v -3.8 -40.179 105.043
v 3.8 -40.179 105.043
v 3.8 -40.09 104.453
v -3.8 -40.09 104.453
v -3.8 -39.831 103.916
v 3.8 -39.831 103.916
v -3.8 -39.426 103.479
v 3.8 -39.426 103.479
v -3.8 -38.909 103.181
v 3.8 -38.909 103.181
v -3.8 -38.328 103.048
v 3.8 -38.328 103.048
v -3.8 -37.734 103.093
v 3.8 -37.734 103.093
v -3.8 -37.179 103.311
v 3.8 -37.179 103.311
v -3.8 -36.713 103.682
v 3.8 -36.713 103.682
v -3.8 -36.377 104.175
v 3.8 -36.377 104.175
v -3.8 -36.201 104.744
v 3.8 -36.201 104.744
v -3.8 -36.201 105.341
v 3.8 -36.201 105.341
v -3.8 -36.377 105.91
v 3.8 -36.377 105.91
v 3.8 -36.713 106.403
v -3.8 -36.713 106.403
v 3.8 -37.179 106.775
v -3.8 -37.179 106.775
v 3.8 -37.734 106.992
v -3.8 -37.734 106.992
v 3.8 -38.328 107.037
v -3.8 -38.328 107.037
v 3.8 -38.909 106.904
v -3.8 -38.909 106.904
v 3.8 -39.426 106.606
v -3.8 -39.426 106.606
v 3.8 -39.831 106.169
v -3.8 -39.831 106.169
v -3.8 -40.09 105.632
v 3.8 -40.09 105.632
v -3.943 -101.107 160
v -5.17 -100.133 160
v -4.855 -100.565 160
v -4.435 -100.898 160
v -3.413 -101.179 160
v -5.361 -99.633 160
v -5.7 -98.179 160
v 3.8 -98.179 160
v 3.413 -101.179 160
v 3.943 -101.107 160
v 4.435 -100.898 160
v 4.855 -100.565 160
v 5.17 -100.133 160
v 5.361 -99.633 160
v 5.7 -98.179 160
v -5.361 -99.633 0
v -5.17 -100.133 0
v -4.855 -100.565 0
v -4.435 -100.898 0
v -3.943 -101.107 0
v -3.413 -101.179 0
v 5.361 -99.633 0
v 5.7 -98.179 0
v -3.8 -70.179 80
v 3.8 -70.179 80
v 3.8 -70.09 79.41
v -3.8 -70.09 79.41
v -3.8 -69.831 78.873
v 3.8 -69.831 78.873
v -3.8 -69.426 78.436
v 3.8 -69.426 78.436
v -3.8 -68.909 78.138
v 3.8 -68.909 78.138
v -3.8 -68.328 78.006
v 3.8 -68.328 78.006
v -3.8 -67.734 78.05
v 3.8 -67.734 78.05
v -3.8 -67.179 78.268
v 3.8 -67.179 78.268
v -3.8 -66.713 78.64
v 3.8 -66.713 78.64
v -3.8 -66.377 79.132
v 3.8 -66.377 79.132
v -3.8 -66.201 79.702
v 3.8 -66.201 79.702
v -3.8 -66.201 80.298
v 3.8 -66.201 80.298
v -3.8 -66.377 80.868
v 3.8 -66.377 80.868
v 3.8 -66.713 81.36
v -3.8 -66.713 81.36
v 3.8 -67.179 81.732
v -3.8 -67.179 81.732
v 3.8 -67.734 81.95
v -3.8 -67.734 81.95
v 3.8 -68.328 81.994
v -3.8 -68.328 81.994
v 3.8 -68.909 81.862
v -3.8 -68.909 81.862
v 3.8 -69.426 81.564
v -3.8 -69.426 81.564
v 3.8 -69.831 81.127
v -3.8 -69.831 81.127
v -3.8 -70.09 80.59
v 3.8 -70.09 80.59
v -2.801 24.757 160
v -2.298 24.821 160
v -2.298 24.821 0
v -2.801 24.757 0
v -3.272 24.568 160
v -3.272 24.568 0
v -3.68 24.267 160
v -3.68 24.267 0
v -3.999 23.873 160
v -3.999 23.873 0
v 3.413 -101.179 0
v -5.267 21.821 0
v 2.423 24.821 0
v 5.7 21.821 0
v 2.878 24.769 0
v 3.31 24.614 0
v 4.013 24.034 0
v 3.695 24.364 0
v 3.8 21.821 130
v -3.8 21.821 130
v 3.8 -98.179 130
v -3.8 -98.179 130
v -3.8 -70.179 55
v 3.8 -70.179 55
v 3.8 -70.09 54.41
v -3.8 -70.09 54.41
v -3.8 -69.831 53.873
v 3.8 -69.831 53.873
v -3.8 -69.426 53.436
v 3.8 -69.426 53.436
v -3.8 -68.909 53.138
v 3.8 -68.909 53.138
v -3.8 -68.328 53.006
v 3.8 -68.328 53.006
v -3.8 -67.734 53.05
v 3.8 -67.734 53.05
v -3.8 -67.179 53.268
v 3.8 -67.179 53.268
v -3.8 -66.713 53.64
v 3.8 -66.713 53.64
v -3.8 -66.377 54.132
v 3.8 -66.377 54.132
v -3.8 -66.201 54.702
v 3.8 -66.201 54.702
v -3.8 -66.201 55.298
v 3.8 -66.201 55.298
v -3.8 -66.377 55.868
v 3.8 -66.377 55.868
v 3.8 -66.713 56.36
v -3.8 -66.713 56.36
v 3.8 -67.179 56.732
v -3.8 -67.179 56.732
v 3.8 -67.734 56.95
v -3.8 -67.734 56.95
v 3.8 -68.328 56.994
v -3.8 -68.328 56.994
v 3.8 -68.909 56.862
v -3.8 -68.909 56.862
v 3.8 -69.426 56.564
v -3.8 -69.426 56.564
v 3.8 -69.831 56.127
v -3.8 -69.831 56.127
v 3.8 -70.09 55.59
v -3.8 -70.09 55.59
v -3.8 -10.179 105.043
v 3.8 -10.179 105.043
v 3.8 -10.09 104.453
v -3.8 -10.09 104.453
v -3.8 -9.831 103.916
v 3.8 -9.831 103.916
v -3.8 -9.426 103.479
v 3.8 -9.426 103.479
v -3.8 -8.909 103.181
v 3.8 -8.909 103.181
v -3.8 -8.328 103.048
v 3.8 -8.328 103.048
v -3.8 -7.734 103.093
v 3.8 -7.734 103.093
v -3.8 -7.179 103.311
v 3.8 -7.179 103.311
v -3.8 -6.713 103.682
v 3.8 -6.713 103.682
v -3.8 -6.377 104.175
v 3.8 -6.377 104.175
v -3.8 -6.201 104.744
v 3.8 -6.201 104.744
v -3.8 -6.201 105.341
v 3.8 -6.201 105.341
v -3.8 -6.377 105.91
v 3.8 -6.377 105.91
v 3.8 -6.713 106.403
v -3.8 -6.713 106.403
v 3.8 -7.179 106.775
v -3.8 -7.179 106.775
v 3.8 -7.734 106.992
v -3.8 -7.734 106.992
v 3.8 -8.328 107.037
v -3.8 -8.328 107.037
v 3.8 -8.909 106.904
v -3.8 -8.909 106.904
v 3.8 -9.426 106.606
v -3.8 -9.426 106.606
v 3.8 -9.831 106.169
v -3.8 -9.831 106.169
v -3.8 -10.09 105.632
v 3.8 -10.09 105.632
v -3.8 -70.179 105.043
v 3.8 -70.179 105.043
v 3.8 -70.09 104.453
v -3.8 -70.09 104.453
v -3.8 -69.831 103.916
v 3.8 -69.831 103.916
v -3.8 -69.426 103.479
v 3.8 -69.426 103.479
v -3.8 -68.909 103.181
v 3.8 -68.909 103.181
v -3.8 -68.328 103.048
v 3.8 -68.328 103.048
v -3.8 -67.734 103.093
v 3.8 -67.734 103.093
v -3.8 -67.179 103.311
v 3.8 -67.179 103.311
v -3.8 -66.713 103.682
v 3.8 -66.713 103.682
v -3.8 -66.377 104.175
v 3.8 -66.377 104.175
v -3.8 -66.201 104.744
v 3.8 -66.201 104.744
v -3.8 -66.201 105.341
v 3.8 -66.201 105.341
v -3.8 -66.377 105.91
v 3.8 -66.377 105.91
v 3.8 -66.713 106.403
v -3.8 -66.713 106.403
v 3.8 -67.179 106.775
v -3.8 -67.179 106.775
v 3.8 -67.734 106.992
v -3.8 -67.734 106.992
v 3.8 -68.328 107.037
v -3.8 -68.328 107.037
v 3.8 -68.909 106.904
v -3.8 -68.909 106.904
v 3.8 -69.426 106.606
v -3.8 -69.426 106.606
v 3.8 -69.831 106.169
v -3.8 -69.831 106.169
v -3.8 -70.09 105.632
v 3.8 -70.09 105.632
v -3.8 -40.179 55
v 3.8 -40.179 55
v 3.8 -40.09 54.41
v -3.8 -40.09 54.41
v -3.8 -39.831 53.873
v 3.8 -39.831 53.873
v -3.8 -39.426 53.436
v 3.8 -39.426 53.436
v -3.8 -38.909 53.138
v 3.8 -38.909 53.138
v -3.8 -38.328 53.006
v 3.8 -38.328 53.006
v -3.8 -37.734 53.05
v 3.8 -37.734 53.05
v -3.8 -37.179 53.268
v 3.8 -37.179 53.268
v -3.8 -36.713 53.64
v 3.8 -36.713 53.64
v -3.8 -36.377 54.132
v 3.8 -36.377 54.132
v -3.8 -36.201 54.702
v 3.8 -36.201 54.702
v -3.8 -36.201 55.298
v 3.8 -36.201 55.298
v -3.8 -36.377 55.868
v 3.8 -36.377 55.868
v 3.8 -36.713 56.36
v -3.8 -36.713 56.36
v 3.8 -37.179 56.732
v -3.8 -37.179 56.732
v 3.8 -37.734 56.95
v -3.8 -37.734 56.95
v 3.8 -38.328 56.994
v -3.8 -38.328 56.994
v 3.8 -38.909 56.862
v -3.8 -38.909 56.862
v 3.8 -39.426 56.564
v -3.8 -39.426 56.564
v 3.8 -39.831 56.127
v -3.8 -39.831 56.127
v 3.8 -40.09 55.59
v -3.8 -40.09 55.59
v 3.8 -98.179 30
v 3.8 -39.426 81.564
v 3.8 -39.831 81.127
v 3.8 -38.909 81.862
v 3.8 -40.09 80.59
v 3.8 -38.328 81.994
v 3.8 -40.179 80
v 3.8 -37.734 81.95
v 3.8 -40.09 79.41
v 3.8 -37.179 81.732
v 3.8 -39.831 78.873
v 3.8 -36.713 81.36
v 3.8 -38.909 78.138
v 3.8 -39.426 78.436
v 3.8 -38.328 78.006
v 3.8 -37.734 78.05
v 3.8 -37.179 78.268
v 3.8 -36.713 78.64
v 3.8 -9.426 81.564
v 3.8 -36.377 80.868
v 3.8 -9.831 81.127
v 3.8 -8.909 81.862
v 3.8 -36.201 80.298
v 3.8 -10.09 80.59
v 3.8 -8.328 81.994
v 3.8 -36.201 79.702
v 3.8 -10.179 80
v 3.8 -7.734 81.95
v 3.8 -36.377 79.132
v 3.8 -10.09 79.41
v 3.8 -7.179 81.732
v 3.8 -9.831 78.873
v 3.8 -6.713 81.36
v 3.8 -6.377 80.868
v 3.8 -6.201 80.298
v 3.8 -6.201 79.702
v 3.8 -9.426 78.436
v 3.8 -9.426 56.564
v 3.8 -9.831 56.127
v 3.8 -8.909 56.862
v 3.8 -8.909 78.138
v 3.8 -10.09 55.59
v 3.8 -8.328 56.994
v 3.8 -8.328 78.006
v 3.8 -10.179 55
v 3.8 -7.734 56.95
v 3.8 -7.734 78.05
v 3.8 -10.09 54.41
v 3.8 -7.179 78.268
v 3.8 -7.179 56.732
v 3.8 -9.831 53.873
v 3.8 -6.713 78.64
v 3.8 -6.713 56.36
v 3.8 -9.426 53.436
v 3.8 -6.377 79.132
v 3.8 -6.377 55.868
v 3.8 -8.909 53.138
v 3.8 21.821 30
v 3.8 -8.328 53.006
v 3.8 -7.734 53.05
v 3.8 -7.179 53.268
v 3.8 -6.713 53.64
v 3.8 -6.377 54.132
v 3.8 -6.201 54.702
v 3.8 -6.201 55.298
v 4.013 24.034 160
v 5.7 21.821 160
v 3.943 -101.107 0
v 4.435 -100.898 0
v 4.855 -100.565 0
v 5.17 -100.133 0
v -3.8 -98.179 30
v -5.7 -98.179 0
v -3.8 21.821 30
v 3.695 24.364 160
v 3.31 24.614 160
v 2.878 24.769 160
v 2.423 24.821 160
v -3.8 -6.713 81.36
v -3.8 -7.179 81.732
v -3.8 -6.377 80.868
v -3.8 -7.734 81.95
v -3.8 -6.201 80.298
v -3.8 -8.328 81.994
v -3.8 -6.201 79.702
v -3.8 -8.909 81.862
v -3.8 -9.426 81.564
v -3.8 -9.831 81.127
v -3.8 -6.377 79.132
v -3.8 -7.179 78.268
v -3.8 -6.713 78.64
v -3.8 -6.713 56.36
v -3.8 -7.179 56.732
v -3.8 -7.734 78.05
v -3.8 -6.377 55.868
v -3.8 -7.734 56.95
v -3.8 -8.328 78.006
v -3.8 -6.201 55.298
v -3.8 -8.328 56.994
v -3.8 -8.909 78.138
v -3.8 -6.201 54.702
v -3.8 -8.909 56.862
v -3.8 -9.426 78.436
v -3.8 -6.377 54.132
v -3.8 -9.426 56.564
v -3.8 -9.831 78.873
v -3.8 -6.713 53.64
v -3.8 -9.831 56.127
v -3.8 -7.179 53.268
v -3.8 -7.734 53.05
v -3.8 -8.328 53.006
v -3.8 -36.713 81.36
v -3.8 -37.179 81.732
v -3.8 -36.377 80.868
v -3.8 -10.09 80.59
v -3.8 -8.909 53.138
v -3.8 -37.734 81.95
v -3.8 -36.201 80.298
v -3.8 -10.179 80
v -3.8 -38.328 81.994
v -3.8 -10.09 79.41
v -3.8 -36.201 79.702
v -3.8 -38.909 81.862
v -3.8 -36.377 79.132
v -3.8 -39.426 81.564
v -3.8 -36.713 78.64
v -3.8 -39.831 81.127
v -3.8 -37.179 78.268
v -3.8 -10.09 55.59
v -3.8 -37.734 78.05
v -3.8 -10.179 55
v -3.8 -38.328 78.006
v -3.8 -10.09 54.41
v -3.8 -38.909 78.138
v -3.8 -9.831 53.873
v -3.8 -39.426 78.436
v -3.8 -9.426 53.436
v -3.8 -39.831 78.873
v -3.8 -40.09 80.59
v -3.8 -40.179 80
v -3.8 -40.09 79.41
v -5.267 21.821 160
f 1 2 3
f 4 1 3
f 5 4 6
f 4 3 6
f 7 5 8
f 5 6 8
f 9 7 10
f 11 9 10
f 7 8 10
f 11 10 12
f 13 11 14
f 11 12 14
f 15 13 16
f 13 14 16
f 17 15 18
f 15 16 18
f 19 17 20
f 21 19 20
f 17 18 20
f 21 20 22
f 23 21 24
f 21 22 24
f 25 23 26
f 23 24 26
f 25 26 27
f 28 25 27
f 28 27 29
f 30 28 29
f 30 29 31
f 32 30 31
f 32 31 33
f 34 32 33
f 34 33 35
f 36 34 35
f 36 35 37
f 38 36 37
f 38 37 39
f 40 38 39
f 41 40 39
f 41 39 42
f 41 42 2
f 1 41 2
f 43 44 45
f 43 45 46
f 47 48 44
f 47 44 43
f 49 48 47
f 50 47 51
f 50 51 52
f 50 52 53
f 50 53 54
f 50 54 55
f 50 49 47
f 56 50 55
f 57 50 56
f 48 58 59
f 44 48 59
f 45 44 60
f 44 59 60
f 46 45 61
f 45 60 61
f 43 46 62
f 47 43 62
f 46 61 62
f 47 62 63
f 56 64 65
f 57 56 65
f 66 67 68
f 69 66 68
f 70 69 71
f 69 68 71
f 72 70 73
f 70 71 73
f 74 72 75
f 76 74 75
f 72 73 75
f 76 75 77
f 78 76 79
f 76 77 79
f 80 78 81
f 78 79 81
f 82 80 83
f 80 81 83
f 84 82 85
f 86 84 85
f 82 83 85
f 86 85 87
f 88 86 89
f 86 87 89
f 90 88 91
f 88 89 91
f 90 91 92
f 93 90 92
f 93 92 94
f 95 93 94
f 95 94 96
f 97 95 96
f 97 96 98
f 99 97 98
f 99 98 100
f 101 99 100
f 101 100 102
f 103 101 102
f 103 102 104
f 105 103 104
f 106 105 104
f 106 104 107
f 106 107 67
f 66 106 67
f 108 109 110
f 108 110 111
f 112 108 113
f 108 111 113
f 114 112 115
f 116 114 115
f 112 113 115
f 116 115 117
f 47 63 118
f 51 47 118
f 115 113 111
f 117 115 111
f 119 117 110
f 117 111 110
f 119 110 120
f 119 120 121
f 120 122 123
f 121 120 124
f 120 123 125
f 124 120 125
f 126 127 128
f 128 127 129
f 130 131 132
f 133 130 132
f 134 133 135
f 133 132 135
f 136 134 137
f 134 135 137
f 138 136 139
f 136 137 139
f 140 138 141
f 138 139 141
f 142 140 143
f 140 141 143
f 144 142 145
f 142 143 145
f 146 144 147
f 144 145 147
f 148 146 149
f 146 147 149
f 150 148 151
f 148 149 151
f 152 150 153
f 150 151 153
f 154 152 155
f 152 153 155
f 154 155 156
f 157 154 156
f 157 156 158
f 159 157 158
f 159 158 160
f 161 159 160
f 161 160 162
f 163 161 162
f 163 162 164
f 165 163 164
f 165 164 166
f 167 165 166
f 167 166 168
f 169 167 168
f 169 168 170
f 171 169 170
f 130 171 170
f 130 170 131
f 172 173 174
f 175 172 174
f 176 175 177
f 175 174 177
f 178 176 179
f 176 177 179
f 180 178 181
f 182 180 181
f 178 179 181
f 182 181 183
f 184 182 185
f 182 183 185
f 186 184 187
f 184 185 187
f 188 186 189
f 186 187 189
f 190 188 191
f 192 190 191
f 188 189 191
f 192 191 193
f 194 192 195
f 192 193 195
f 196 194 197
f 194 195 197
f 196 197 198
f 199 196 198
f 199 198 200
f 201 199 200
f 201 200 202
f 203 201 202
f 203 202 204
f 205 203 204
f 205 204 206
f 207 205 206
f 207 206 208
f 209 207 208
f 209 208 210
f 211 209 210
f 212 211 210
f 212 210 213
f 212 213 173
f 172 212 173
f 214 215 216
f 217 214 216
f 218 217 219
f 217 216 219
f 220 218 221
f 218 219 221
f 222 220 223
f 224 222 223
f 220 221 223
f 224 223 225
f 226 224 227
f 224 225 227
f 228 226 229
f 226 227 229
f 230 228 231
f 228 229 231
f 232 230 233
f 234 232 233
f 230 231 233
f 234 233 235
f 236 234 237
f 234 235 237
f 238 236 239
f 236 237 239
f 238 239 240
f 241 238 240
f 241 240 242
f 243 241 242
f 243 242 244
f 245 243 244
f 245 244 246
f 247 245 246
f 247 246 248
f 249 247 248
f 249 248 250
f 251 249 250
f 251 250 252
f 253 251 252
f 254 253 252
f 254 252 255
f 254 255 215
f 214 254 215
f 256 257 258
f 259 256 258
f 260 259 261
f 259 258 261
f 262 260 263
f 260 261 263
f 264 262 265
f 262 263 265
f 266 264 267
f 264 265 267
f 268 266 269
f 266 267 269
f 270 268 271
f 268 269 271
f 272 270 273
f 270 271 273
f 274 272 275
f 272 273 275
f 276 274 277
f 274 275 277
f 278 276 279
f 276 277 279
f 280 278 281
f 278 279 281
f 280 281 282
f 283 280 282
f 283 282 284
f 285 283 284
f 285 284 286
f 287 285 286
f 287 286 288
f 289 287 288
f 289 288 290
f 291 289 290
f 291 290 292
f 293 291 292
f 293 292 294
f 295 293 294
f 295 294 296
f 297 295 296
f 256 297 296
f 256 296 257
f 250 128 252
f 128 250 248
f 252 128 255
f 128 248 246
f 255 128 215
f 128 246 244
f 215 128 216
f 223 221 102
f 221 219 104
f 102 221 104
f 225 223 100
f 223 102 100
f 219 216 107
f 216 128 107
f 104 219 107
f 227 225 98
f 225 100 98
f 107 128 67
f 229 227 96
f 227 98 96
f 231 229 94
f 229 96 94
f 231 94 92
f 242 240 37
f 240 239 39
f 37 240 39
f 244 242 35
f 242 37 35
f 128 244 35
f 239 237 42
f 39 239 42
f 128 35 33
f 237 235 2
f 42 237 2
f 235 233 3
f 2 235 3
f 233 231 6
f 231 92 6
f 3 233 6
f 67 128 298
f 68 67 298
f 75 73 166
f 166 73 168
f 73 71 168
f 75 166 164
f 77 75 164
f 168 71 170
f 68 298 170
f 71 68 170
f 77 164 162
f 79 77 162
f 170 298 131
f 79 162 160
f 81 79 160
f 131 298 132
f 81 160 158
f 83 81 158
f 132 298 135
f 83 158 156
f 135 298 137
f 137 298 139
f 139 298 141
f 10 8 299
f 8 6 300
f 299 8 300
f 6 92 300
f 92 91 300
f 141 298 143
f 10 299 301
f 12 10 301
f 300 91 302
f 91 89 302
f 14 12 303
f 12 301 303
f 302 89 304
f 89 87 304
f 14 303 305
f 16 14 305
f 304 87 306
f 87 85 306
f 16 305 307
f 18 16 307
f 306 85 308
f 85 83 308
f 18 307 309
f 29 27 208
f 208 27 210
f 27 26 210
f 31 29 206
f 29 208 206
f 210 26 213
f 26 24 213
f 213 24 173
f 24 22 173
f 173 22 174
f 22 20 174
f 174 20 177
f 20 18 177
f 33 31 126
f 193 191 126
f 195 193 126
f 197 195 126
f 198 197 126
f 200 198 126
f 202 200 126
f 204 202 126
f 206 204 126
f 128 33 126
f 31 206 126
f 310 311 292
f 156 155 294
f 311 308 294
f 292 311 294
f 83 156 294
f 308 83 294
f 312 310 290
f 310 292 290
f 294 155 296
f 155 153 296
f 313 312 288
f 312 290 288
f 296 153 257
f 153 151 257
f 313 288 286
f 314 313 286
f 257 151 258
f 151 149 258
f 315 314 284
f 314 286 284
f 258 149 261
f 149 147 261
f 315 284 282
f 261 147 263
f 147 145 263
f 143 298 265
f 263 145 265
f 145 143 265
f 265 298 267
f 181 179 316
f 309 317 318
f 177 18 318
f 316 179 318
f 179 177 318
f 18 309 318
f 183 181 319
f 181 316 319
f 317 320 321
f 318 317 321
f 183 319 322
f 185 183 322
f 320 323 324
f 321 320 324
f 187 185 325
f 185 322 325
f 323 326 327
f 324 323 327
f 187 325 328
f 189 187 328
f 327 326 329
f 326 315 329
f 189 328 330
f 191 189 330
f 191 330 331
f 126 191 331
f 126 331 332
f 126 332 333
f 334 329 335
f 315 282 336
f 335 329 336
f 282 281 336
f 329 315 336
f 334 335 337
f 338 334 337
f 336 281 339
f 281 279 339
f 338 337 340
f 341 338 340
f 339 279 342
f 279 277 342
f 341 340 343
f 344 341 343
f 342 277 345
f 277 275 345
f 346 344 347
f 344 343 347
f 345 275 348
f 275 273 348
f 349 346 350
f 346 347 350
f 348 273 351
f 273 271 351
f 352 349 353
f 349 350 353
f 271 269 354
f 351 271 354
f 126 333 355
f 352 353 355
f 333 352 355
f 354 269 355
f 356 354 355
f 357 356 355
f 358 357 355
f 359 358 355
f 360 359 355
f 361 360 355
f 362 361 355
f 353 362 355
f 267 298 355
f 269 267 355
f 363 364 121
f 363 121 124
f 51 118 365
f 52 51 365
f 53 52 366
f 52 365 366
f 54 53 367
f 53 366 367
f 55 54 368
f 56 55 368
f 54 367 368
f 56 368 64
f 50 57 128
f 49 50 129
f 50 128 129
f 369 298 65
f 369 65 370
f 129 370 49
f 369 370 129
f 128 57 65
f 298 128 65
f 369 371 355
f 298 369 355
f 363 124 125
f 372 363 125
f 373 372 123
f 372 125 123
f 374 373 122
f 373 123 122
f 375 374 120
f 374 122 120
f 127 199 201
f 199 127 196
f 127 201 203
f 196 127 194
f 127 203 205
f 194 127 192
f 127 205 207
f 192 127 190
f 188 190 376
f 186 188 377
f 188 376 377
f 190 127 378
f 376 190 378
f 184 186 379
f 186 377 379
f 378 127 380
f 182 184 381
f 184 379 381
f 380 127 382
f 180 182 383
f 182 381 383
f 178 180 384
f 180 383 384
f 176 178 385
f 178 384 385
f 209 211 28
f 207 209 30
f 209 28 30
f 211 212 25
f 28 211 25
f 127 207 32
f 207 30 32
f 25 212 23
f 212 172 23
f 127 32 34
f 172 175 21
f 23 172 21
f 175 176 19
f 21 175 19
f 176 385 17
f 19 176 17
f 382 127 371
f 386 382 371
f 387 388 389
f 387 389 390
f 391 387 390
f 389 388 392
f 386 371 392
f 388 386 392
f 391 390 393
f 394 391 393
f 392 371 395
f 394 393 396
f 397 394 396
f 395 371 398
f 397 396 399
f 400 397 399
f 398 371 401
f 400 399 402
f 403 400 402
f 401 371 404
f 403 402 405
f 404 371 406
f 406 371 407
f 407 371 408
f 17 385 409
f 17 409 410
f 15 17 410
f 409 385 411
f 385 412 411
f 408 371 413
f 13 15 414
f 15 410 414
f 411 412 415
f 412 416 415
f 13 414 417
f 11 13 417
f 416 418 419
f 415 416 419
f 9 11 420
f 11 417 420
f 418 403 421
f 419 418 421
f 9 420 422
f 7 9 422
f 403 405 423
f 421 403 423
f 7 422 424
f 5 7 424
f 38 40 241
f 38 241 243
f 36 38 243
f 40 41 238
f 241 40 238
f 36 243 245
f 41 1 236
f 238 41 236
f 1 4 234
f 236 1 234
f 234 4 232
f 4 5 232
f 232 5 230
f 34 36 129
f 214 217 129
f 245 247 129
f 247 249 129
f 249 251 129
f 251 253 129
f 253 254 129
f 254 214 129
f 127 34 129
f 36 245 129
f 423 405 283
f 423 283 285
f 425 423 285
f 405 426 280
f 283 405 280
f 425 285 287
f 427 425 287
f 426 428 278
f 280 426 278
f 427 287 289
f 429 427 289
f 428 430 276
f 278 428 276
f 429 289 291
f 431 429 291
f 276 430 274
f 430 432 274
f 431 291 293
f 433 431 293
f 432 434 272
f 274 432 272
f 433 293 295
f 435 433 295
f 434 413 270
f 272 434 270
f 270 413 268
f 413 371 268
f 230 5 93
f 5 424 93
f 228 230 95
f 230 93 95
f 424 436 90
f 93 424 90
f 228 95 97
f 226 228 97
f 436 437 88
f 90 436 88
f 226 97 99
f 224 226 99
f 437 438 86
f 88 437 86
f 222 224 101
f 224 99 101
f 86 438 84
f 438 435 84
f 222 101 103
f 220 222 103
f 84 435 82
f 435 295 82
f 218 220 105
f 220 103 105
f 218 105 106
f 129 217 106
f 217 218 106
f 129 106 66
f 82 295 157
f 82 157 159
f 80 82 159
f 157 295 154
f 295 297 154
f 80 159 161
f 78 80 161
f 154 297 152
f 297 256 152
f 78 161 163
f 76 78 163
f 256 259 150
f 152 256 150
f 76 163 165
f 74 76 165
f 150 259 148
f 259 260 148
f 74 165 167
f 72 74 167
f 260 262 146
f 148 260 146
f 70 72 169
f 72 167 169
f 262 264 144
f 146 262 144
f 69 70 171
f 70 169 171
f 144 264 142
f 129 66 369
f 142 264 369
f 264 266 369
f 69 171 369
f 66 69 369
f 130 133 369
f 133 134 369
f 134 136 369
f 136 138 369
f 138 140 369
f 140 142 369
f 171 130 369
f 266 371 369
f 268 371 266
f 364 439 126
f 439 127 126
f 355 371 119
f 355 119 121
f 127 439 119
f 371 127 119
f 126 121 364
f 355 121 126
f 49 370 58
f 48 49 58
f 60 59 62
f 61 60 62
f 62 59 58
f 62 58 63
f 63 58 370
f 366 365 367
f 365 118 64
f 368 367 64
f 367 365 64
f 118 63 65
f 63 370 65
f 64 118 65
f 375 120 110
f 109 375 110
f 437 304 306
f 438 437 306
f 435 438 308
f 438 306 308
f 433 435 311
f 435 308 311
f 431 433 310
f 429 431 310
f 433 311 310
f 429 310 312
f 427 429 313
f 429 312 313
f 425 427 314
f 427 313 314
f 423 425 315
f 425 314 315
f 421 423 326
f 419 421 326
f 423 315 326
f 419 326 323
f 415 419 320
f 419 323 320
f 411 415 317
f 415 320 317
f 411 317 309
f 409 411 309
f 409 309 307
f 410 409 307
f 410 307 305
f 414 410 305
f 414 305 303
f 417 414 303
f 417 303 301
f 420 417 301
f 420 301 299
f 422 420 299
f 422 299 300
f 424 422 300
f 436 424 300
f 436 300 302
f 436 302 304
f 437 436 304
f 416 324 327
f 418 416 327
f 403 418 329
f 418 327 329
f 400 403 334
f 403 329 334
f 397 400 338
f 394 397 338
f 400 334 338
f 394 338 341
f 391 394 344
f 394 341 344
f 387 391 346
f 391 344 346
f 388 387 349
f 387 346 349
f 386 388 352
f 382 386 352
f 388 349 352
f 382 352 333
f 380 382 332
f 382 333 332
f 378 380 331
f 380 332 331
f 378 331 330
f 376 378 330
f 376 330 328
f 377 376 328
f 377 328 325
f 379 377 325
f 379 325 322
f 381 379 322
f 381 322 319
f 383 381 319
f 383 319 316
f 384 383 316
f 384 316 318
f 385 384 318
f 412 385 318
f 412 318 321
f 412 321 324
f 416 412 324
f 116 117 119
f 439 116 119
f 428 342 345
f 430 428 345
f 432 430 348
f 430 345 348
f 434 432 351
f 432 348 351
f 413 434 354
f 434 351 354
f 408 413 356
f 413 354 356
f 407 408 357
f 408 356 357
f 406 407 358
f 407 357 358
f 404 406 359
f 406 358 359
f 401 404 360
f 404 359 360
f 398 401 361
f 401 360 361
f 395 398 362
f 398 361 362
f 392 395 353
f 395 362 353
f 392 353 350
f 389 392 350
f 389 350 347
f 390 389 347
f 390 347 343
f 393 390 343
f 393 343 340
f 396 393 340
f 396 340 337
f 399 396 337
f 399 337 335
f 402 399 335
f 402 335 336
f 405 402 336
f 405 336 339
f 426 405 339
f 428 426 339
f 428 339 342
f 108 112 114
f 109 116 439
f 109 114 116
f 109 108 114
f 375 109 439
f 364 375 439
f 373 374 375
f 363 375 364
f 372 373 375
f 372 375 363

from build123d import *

# Parameters (mm, degrees)
RESSALTO_EXTRUS_O1_DEPTH = 160
ESBO_O2_W                = 7.6
ESBO_O2_H                = 120
CORTE_EXTRUS_O1_DEPTH    = 30
CORTE_EXTRUS_O2_DEPTH    = 30
F_3DSKETCH3_R            = 2
CORTE_EXTRUS_O3_DEPTH    = 70


with BuildPart() as part:
    # Esboço1 → Ressalto-extrusão1 (new body)
    with BuildSketch(Plane.XY):
        with BuildLine():
            Line((-3.8, 21.821375341), (-3.8, -98.178624659))
            Line((-3.8, -98.178624659), (-5.7, -98.178624659))
            Line((-5.7, -98.178624659), (-5.360626179, -99.63308389))
            ThreePointArc((-5.360626179, -99.63308389), (-4.656141559, -100.745296045), (-3.41294376, -101.178624659))
            Line((-3.41294376, -101.178624659), (3.41294376, -101.178624659))
            ThreePointArc((3.41294376, -101.178624659), (4.656141559, -100.745296045), (5.360626179, -99.63308389))
            Line((5.360626179, -99.63308389), (5.7, -98.178624659))
            Line((5.7, -98.178624659), (3.8, -98.178624659))
            Line((3.8, -98.178624659), (3.8, 21.821375341))
            Line((3.8, 21.821375341), (5.7, 21.821375341))
            Line((5.7, 21.821375341), (4.013268169, 24.033911877))
            ThreePointArc((4.013268169, 24.033911877), (3.310139149, 24.613730366), (2.422747768, 24.821375341))
            Line((2.422747768, 24.821375341), (-2.297792791, 24.821375341))
            ThreePointArc((-2.297792791, 24.821375341), (-3.27177376, 24.568189891), (-3.999156919, 23.872736414))
            Line((-3.999156919, 23.872736414), (-5.266799243, 21.821375341))
            Line((-5.266799243, 21.821375341), (-3.8, 21.821375341))
        make_face()
    extrude(amount=RESSALTO_EXTRUS_O1_DEPTH)

    # Esboço2 → Corte-extrusão1 (cut)
    with BuildSketch(Plane.XY):
        with Locations((0, -38.178624659)):
            Rectangle(ESBO_O2_W, ESBO_O2_H)
    extrude(amount=CORTE_EXTRUS_O1_DEPTH, mode=Mode.SUBTRACT)

    # 3DSketch2 → Corte-extrusão2 (cut)
    with BuildSketch(Plane(origin=(-3.8, 21.821375341, 160), x_dir=(0.0632066956560733, -0.9980004577274705, 0), z_dir=(0, 0, -1))):
        Polygon((0, 0), (0.480370887, -7.584803479), (120.240425814, 0), (119.760054927, 7.584803479), align=None)
    extrude(amount=CORTE_EXTRUS_O2_DEPTH, mode=Mode.SUBTRACT)

    # 3DSketch3 → Corte-extrusão3 (cut)
    with BuildSketch(Plane(origin=(3.8, -38.178624659, 80), x_dir=(0, 0.7676852805184269, 0.6408270516101394), z_dir=(1, 0, 0))):
        with Locations(Location((0, 0, 0), (0, 0, 140.146481665))):
            Circle(F_3DSKETCH3_R)
        with Locations(Location((23.030558416, -19.224811548, 0), (0, 0, 140.146481665))):
            Circle(F_3DSKETCH3_R)
        with Locations(Location((-23.030558416, 19.224811548, 0), (0, 0, 140.146481665))):
            Circle(F_3DSKETCH3_R)
        with Locations(Location((-39.051234706, 0.032679535, 0), (0, 0, 140.146481665))):
            Circle(F_3DSKETCH3_R)
        with Locations(Location((-16.02067629, -19.192132013, 0), (0, 0, 140.146481665))):
            Circle(F_3DSKETCH3_R)
        with Locations(Location((7.009882125, -38.416943561, 0), (0, 0, 140.146481665))):
            Circle(F_3DSKETCH3_R)
        with Locations(Location((-6.982602808, 38.449623097, 0), (0, 0, 140.146481665))):
            Circle(F_3DSKETCH3_R)
        with Locations(Location((16.047955607, 19.224811548, 0), (0, 0, 140.146481665))):
            Circle(F_3DSKETCH3_R)
        with Locations(Location((39.078514023, 0, 0), (0, 0, 140.146481665))):
            Circle(F_3DSKETCH3_R)
    extrude(amount=-CORTE_EXTRUS_O3_DEPTH, mode=Mode.SUBTRACT)


solid = part.part
